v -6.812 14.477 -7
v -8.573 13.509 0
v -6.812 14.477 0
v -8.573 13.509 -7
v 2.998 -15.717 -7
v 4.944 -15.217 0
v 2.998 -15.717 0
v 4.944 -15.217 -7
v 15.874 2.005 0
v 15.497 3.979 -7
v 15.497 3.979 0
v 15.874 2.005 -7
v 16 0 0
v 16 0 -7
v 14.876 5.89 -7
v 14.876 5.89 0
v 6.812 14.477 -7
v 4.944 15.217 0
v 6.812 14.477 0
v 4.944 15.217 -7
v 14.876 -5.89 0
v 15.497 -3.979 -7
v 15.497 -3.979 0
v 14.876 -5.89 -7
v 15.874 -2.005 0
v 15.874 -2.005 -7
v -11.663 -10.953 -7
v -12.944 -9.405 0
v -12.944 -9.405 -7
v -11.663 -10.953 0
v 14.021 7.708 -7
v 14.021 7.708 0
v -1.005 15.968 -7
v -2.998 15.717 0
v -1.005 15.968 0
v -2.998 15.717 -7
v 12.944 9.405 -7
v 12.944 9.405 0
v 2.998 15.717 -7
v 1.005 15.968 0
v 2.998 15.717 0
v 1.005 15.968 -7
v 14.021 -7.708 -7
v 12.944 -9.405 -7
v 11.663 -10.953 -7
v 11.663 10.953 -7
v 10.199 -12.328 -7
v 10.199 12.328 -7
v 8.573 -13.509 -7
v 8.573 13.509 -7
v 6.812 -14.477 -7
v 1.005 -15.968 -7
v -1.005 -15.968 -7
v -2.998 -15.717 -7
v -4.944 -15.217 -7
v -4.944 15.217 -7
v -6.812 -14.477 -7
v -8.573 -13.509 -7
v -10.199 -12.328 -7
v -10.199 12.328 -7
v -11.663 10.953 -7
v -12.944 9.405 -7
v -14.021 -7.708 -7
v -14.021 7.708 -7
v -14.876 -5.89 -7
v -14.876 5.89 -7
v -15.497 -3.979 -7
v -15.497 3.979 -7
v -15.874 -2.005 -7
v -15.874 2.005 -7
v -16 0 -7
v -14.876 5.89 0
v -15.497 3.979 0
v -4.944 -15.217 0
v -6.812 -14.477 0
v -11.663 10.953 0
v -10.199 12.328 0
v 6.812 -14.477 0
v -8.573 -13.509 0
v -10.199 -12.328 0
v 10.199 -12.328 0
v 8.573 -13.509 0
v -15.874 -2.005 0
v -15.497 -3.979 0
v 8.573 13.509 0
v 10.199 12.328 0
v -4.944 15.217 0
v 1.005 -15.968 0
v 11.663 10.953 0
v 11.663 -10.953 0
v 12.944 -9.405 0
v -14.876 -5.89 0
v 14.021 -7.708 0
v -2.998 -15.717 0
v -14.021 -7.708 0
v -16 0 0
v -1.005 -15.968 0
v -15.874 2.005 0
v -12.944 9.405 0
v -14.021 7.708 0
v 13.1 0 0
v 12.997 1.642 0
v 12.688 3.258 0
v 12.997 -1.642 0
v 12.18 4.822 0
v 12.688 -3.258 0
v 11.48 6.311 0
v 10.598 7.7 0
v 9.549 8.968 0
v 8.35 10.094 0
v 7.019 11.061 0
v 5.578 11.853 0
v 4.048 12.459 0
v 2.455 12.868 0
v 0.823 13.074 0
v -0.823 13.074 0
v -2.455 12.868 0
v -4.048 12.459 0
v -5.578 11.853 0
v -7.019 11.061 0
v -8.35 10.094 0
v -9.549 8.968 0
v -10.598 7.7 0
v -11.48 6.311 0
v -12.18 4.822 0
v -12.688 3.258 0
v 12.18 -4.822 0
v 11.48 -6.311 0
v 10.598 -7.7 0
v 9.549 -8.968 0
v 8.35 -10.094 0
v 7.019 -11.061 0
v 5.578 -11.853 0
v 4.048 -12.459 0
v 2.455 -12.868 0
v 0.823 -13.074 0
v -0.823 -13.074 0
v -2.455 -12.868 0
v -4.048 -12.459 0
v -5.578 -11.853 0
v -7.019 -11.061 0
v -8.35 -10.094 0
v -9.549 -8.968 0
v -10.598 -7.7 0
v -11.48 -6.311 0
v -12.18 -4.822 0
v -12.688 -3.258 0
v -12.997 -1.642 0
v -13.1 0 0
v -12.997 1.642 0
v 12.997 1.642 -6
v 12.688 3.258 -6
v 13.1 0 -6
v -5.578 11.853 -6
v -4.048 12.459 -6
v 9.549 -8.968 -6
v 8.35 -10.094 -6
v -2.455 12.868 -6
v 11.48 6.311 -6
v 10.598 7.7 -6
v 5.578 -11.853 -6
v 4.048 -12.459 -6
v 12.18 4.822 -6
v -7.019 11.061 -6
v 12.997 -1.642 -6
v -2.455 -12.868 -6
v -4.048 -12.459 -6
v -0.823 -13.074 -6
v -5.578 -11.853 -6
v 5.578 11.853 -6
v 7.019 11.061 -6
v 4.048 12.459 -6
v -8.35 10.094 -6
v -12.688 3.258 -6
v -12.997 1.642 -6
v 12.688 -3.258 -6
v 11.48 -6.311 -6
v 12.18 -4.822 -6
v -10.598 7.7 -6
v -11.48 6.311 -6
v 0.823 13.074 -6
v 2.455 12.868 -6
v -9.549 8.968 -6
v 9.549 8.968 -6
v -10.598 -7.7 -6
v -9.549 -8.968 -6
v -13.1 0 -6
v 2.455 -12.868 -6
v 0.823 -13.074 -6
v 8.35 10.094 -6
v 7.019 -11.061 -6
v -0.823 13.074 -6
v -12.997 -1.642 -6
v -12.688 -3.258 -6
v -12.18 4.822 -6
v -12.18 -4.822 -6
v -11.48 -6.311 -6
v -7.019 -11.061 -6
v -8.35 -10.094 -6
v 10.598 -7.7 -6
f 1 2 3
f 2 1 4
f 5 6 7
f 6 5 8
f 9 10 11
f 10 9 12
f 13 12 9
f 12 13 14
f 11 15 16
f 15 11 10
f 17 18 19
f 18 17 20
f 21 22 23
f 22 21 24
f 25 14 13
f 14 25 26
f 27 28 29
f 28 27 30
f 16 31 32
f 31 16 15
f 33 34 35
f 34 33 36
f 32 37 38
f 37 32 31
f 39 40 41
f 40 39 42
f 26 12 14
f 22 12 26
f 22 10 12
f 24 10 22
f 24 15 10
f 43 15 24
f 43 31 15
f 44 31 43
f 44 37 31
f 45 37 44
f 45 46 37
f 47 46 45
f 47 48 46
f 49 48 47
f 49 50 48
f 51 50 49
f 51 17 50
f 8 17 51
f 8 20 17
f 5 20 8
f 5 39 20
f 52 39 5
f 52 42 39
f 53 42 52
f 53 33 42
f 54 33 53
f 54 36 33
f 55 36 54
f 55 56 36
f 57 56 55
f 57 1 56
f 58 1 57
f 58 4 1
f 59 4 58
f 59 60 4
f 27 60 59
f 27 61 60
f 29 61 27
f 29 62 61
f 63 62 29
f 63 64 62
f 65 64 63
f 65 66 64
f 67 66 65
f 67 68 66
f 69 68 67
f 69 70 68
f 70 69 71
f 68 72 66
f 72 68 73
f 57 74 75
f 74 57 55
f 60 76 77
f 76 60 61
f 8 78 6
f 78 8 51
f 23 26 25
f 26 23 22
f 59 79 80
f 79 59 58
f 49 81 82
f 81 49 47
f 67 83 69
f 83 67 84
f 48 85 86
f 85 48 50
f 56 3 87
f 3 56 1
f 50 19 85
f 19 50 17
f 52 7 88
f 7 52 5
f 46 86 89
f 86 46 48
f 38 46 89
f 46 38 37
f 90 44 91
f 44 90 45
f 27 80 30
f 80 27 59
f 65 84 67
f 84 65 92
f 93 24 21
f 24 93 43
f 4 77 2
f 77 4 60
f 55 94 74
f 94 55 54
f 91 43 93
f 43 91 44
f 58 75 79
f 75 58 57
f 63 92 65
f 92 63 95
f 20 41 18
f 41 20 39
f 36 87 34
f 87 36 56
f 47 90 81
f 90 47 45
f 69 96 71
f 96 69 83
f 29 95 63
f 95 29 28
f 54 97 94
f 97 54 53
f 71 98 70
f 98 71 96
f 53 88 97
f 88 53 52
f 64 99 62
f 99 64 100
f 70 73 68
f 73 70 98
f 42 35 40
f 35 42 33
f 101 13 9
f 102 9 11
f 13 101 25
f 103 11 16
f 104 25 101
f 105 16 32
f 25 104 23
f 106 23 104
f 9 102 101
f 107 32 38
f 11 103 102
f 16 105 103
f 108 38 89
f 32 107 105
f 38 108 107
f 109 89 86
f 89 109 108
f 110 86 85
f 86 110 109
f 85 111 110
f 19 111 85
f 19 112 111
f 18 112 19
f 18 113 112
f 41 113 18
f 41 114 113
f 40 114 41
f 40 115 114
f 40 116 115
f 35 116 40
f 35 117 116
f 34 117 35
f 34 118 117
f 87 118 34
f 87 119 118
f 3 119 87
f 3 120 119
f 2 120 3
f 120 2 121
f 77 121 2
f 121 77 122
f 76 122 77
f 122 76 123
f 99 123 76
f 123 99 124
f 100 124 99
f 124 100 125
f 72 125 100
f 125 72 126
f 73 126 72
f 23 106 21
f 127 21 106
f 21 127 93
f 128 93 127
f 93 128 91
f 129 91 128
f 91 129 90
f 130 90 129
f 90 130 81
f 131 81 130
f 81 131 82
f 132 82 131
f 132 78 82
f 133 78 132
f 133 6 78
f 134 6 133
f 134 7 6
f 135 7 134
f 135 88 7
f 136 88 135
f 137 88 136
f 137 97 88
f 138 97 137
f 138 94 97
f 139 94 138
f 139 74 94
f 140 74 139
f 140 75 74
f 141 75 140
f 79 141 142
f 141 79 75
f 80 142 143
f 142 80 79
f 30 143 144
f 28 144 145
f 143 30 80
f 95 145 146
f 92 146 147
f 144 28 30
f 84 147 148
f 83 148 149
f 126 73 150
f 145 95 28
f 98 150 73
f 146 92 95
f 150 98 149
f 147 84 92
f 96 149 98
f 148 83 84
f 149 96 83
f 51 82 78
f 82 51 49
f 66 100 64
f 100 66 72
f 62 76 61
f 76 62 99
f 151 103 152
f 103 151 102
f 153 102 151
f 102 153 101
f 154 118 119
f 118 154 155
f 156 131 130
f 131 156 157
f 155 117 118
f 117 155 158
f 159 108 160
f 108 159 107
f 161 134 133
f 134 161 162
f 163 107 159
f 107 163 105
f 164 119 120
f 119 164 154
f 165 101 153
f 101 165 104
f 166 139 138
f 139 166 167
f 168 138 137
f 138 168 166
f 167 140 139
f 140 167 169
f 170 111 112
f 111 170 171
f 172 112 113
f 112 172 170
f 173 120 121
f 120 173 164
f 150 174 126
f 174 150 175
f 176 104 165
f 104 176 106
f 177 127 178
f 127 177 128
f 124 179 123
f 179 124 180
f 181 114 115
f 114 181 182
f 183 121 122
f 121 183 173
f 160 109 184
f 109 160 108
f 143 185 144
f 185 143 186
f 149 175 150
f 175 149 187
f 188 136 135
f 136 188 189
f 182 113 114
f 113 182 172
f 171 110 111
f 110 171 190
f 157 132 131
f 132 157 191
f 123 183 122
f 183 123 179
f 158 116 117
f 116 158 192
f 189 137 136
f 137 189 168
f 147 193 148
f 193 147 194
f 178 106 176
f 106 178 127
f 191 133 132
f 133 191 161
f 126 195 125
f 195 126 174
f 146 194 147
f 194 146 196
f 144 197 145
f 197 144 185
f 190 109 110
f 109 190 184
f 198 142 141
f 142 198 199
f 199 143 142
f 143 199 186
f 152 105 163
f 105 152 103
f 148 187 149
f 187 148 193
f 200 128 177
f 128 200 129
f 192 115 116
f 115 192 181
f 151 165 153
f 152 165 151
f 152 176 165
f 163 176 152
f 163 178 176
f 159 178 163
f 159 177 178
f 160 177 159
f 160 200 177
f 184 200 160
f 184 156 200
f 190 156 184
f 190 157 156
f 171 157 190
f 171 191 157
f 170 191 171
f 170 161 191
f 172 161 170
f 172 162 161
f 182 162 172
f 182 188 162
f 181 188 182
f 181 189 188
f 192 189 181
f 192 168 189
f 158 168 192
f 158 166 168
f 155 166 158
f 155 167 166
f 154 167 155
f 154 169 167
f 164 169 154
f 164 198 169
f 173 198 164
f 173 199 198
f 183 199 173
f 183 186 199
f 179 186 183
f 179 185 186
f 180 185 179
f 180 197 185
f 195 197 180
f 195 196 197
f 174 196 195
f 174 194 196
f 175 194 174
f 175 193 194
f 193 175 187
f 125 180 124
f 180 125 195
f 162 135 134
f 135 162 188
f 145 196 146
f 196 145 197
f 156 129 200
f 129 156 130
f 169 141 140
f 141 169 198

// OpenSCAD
$fn = 50;


difference() {
	union() {
		translate(v = [0, 0, -7.0000000000]) {
			cylinder(h = 7, r = 16.0000000000);
		}
	}
	union() {
		#translate(v = [0, 0, -6.0000000000]) {
			cylinder(h = 6, r = 13.1000000000);
		}
	}
}
